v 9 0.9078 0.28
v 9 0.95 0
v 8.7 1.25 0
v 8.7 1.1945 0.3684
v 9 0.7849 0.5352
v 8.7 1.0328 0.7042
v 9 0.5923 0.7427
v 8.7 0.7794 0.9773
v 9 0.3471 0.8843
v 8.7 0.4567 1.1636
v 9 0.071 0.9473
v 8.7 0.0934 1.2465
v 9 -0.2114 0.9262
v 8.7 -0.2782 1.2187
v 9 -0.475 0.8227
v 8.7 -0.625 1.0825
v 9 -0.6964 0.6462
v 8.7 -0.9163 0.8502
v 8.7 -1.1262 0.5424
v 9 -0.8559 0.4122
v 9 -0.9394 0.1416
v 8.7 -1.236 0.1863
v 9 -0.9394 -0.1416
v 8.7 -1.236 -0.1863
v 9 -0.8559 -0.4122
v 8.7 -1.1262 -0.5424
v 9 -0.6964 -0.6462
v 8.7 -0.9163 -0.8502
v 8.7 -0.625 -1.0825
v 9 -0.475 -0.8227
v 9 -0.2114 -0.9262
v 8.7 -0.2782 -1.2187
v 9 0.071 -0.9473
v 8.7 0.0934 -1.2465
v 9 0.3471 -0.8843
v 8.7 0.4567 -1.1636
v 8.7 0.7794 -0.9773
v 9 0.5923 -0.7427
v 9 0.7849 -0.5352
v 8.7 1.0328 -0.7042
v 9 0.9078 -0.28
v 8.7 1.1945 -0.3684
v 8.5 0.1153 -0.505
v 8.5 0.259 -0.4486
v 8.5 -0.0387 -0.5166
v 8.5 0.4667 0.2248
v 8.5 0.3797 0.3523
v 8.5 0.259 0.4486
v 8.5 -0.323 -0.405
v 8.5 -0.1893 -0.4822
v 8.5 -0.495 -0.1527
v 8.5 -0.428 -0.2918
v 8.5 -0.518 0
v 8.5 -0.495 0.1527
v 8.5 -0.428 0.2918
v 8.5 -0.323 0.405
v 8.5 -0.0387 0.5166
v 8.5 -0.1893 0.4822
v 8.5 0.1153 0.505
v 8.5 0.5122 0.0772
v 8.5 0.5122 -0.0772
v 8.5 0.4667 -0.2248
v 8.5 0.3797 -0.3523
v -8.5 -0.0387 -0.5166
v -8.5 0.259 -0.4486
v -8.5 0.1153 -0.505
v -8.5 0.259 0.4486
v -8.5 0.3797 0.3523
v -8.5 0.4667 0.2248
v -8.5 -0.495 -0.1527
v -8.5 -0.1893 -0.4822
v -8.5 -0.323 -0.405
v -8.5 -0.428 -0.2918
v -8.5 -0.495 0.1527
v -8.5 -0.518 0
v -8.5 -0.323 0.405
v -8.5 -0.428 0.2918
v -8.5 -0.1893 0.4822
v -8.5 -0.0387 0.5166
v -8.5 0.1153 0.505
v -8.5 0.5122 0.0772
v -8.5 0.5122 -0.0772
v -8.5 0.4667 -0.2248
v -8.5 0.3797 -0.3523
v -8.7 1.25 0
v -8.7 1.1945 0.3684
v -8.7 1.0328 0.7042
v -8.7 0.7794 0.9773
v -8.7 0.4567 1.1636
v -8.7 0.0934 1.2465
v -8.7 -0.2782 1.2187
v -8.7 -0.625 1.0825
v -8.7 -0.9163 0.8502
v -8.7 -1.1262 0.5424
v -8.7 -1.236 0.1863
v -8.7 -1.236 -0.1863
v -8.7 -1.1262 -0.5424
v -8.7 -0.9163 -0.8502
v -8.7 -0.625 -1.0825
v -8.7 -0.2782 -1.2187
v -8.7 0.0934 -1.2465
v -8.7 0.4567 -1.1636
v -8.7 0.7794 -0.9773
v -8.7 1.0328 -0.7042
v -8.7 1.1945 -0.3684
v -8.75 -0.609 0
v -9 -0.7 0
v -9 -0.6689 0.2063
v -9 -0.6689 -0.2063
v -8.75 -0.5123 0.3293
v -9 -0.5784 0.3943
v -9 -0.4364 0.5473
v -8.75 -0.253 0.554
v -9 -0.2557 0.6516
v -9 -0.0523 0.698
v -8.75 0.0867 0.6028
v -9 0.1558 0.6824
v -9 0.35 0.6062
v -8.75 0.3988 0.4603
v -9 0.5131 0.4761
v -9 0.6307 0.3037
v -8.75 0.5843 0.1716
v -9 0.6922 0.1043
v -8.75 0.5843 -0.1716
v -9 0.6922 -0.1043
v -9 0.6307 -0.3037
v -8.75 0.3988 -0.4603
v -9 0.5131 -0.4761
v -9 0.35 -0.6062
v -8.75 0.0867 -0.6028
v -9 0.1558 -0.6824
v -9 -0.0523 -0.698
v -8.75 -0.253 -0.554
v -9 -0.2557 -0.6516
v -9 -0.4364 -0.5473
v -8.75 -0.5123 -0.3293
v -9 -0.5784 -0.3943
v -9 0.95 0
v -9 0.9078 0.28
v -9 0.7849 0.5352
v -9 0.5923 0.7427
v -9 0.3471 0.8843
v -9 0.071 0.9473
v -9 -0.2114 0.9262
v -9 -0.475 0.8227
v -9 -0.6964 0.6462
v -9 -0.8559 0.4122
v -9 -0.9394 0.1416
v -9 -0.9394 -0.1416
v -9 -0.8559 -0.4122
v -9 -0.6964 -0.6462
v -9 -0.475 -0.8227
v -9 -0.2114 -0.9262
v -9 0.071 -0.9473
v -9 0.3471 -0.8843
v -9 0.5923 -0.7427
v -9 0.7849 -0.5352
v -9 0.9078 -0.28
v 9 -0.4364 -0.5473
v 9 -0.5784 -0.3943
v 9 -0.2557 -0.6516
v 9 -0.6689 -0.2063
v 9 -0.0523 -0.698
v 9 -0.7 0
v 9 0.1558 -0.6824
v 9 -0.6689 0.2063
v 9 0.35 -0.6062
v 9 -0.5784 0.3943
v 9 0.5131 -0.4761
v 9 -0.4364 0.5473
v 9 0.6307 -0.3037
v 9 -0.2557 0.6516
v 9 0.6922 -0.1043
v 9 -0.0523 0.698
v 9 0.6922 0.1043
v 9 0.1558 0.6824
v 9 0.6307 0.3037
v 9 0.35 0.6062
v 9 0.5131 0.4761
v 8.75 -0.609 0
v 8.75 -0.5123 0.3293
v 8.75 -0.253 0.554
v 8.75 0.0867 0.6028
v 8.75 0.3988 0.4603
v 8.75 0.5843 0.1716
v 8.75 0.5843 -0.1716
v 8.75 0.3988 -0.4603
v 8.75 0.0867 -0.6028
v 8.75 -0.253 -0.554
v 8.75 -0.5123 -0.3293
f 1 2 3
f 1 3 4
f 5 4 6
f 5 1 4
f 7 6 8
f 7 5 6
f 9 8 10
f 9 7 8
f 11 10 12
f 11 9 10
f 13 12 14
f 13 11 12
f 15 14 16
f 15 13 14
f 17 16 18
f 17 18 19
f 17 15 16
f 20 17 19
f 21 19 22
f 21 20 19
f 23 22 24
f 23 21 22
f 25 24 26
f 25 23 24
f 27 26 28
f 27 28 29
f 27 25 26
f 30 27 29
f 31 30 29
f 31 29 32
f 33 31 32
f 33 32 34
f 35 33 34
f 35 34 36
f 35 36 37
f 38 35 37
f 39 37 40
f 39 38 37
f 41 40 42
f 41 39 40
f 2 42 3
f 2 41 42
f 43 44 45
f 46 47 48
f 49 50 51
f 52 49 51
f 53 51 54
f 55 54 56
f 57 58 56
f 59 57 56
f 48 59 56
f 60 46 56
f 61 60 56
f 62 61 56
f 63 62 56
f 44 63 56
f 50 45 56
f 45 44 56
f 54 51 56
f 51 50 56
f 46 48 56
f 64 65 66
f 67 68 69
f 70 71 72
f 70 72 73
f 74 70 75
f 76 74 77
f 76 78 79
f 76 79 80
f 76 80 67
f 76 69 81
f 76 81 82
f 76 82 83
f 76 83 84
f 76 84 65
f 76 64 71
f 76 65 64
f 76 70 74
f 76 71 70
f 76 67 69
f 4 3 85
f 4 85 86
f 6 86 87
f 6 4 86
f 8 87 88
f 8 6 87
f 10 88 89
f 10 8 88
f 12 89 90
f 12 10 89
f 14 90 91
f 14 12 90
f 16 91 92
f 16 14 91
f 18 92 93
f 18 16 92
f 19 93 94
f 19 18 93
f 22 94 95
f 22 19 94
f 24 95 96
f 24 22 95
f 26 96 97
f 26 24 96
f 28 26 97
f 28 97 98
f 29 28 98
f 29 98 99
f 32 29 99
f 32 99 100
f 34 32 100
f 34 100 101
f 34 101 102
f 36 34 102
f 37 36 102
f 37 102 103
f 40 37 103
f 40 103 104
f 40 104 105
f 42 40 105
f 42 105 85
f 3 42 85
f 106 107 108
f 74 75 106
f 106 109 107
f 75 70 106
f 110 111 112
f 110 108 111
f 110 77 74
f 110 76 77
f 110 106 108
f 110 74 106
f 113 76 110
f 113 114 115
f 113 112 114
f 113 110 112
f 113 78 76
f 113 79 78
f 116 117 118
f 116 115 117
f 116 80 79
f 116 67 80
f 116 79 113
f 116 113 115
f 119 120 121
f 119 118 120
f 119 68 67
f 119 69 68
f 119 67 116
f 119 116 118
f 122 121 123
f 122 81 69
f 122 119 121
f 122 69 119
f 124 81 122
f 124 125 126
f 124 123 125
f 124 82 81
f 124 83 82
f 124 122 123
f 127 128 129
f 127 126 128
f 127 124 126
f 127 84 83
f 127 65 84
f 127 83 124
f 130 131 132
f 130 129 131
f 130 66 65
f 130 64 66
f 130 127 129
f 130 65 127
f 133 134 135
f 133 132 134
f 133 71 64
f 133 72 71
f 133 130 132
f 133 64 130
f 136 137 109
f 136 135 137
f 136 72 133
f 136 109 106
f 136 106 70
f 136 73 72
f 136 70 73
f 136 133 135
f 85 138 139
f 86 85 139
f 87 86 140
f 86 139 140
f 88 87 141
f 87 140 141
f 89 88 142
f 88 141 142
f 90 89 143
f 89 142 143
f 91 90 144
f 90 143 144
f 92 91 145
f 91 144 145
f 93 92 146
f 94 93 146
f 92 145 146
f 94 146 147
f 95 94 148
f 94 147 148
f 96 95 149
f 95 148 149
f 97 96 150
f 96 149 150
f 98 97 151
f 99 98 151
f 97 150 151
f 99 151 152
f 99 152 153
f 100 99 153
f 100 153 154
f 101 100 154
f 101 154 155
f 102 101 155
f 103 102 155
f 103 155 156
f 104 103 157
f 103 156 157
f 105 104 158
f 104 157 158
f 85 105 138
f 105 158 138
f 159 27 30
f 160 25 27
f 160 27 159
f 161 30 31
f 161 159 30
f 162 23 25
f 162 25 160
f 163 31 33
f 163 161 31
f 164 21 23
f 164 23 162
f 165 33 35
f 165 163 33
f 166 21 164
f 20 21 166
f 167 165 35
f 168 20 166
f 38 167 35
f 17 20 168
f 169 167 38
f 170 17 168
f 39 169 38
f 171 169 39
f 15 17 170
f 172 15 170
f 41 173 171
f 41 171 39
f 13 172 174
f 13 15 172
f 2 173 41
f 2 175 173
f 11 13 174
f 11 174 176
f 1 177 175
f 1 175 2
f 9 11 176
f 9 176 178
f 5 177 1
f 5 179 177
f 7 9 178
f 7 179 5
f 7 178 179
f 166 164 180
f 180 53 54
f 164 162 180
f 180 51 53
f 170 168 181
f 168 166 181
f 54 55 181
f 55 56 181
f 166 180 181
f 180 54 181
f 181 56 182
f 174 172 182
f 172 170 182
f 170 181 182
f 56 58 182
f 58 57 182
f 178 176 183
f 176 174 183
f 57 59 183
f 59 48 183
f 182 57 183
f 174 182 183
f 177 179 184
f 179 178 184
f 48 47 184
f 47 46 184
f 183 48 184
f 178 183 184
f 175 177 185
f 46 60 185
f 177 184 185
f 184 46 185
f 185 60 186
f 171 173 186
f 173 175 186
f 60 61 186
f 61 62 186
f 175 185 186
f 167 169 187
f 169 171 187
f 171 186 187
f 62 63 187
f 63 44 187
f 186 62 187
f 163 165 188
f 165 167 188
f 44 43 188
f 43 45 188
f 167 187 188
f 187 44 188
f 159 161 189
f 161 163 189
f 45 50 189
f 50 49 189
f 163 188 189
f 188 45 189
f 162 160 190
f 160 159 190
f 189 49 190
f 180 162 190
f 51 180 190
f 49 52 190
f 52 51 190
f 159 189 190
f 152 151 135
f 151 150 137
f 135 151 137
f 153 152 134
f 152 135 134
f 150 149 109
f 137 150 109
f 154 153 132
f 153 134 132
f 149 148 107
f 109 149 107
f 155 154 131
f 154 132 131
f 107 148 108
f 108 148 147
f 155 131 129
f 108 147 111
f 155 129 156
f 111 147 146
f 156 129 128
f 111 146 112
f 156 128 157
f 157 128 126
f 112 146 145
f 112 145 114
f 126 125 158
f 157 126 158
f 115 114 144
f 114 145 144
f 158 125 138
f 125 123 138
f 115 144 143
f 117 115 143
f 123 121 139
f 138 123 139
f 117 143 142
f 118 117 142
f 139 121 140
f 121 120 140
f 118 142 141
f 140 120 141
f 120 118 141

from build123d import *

# Parameters (mm, degrees)
F0_R     = 1.25
F1_DEPTH = 9
F2_SIZE  = 0.3
F3_R     = 0.7
F4_DEPTH = 0.5
F4_TAPER = 20


# Not quite as in the source:
# - a pattern or mirror of a feature is missing from the dataset's text; its kind, count and spacing are read off the source's solid


with BuildPart() as f1:
    # F0 (on Right) → F1 (new body, symmetric)
    with BuildSketch(Plane.YZ):
        Circle(F0_R)
    extrude(amount=F1_DEPTH, both=True)

    # F2
    f2_edges = [f1.edges().sort_by_distance(p)[0] for p in [
        (-9, -1.25, 0),
        (9, -1.25, 0),
    ]]
    chamfer(f2_edges, length=F2_SIZE)

    # F3 (on face) → F4 (cut)
    with BuildSketch(Plane(origin=(-9, 0, 0), x_dir=(0, -1, 0), z_dir=(-1, 0, 0))):
        Circle(F3_R)
    f4 = extrude(amount=-F4_DEPTH, taper=F4_TAPER, mode=Mode.SUBTRACT)

    # F4_copies: F4 across plane
    add(f4.mirror(Plane(origin=(0, 0, 0), x_dir=(0, 0, 1), z_dir=(1, 0, 0))), mode=Mode.SUBTRACT)


solid = f1.part
